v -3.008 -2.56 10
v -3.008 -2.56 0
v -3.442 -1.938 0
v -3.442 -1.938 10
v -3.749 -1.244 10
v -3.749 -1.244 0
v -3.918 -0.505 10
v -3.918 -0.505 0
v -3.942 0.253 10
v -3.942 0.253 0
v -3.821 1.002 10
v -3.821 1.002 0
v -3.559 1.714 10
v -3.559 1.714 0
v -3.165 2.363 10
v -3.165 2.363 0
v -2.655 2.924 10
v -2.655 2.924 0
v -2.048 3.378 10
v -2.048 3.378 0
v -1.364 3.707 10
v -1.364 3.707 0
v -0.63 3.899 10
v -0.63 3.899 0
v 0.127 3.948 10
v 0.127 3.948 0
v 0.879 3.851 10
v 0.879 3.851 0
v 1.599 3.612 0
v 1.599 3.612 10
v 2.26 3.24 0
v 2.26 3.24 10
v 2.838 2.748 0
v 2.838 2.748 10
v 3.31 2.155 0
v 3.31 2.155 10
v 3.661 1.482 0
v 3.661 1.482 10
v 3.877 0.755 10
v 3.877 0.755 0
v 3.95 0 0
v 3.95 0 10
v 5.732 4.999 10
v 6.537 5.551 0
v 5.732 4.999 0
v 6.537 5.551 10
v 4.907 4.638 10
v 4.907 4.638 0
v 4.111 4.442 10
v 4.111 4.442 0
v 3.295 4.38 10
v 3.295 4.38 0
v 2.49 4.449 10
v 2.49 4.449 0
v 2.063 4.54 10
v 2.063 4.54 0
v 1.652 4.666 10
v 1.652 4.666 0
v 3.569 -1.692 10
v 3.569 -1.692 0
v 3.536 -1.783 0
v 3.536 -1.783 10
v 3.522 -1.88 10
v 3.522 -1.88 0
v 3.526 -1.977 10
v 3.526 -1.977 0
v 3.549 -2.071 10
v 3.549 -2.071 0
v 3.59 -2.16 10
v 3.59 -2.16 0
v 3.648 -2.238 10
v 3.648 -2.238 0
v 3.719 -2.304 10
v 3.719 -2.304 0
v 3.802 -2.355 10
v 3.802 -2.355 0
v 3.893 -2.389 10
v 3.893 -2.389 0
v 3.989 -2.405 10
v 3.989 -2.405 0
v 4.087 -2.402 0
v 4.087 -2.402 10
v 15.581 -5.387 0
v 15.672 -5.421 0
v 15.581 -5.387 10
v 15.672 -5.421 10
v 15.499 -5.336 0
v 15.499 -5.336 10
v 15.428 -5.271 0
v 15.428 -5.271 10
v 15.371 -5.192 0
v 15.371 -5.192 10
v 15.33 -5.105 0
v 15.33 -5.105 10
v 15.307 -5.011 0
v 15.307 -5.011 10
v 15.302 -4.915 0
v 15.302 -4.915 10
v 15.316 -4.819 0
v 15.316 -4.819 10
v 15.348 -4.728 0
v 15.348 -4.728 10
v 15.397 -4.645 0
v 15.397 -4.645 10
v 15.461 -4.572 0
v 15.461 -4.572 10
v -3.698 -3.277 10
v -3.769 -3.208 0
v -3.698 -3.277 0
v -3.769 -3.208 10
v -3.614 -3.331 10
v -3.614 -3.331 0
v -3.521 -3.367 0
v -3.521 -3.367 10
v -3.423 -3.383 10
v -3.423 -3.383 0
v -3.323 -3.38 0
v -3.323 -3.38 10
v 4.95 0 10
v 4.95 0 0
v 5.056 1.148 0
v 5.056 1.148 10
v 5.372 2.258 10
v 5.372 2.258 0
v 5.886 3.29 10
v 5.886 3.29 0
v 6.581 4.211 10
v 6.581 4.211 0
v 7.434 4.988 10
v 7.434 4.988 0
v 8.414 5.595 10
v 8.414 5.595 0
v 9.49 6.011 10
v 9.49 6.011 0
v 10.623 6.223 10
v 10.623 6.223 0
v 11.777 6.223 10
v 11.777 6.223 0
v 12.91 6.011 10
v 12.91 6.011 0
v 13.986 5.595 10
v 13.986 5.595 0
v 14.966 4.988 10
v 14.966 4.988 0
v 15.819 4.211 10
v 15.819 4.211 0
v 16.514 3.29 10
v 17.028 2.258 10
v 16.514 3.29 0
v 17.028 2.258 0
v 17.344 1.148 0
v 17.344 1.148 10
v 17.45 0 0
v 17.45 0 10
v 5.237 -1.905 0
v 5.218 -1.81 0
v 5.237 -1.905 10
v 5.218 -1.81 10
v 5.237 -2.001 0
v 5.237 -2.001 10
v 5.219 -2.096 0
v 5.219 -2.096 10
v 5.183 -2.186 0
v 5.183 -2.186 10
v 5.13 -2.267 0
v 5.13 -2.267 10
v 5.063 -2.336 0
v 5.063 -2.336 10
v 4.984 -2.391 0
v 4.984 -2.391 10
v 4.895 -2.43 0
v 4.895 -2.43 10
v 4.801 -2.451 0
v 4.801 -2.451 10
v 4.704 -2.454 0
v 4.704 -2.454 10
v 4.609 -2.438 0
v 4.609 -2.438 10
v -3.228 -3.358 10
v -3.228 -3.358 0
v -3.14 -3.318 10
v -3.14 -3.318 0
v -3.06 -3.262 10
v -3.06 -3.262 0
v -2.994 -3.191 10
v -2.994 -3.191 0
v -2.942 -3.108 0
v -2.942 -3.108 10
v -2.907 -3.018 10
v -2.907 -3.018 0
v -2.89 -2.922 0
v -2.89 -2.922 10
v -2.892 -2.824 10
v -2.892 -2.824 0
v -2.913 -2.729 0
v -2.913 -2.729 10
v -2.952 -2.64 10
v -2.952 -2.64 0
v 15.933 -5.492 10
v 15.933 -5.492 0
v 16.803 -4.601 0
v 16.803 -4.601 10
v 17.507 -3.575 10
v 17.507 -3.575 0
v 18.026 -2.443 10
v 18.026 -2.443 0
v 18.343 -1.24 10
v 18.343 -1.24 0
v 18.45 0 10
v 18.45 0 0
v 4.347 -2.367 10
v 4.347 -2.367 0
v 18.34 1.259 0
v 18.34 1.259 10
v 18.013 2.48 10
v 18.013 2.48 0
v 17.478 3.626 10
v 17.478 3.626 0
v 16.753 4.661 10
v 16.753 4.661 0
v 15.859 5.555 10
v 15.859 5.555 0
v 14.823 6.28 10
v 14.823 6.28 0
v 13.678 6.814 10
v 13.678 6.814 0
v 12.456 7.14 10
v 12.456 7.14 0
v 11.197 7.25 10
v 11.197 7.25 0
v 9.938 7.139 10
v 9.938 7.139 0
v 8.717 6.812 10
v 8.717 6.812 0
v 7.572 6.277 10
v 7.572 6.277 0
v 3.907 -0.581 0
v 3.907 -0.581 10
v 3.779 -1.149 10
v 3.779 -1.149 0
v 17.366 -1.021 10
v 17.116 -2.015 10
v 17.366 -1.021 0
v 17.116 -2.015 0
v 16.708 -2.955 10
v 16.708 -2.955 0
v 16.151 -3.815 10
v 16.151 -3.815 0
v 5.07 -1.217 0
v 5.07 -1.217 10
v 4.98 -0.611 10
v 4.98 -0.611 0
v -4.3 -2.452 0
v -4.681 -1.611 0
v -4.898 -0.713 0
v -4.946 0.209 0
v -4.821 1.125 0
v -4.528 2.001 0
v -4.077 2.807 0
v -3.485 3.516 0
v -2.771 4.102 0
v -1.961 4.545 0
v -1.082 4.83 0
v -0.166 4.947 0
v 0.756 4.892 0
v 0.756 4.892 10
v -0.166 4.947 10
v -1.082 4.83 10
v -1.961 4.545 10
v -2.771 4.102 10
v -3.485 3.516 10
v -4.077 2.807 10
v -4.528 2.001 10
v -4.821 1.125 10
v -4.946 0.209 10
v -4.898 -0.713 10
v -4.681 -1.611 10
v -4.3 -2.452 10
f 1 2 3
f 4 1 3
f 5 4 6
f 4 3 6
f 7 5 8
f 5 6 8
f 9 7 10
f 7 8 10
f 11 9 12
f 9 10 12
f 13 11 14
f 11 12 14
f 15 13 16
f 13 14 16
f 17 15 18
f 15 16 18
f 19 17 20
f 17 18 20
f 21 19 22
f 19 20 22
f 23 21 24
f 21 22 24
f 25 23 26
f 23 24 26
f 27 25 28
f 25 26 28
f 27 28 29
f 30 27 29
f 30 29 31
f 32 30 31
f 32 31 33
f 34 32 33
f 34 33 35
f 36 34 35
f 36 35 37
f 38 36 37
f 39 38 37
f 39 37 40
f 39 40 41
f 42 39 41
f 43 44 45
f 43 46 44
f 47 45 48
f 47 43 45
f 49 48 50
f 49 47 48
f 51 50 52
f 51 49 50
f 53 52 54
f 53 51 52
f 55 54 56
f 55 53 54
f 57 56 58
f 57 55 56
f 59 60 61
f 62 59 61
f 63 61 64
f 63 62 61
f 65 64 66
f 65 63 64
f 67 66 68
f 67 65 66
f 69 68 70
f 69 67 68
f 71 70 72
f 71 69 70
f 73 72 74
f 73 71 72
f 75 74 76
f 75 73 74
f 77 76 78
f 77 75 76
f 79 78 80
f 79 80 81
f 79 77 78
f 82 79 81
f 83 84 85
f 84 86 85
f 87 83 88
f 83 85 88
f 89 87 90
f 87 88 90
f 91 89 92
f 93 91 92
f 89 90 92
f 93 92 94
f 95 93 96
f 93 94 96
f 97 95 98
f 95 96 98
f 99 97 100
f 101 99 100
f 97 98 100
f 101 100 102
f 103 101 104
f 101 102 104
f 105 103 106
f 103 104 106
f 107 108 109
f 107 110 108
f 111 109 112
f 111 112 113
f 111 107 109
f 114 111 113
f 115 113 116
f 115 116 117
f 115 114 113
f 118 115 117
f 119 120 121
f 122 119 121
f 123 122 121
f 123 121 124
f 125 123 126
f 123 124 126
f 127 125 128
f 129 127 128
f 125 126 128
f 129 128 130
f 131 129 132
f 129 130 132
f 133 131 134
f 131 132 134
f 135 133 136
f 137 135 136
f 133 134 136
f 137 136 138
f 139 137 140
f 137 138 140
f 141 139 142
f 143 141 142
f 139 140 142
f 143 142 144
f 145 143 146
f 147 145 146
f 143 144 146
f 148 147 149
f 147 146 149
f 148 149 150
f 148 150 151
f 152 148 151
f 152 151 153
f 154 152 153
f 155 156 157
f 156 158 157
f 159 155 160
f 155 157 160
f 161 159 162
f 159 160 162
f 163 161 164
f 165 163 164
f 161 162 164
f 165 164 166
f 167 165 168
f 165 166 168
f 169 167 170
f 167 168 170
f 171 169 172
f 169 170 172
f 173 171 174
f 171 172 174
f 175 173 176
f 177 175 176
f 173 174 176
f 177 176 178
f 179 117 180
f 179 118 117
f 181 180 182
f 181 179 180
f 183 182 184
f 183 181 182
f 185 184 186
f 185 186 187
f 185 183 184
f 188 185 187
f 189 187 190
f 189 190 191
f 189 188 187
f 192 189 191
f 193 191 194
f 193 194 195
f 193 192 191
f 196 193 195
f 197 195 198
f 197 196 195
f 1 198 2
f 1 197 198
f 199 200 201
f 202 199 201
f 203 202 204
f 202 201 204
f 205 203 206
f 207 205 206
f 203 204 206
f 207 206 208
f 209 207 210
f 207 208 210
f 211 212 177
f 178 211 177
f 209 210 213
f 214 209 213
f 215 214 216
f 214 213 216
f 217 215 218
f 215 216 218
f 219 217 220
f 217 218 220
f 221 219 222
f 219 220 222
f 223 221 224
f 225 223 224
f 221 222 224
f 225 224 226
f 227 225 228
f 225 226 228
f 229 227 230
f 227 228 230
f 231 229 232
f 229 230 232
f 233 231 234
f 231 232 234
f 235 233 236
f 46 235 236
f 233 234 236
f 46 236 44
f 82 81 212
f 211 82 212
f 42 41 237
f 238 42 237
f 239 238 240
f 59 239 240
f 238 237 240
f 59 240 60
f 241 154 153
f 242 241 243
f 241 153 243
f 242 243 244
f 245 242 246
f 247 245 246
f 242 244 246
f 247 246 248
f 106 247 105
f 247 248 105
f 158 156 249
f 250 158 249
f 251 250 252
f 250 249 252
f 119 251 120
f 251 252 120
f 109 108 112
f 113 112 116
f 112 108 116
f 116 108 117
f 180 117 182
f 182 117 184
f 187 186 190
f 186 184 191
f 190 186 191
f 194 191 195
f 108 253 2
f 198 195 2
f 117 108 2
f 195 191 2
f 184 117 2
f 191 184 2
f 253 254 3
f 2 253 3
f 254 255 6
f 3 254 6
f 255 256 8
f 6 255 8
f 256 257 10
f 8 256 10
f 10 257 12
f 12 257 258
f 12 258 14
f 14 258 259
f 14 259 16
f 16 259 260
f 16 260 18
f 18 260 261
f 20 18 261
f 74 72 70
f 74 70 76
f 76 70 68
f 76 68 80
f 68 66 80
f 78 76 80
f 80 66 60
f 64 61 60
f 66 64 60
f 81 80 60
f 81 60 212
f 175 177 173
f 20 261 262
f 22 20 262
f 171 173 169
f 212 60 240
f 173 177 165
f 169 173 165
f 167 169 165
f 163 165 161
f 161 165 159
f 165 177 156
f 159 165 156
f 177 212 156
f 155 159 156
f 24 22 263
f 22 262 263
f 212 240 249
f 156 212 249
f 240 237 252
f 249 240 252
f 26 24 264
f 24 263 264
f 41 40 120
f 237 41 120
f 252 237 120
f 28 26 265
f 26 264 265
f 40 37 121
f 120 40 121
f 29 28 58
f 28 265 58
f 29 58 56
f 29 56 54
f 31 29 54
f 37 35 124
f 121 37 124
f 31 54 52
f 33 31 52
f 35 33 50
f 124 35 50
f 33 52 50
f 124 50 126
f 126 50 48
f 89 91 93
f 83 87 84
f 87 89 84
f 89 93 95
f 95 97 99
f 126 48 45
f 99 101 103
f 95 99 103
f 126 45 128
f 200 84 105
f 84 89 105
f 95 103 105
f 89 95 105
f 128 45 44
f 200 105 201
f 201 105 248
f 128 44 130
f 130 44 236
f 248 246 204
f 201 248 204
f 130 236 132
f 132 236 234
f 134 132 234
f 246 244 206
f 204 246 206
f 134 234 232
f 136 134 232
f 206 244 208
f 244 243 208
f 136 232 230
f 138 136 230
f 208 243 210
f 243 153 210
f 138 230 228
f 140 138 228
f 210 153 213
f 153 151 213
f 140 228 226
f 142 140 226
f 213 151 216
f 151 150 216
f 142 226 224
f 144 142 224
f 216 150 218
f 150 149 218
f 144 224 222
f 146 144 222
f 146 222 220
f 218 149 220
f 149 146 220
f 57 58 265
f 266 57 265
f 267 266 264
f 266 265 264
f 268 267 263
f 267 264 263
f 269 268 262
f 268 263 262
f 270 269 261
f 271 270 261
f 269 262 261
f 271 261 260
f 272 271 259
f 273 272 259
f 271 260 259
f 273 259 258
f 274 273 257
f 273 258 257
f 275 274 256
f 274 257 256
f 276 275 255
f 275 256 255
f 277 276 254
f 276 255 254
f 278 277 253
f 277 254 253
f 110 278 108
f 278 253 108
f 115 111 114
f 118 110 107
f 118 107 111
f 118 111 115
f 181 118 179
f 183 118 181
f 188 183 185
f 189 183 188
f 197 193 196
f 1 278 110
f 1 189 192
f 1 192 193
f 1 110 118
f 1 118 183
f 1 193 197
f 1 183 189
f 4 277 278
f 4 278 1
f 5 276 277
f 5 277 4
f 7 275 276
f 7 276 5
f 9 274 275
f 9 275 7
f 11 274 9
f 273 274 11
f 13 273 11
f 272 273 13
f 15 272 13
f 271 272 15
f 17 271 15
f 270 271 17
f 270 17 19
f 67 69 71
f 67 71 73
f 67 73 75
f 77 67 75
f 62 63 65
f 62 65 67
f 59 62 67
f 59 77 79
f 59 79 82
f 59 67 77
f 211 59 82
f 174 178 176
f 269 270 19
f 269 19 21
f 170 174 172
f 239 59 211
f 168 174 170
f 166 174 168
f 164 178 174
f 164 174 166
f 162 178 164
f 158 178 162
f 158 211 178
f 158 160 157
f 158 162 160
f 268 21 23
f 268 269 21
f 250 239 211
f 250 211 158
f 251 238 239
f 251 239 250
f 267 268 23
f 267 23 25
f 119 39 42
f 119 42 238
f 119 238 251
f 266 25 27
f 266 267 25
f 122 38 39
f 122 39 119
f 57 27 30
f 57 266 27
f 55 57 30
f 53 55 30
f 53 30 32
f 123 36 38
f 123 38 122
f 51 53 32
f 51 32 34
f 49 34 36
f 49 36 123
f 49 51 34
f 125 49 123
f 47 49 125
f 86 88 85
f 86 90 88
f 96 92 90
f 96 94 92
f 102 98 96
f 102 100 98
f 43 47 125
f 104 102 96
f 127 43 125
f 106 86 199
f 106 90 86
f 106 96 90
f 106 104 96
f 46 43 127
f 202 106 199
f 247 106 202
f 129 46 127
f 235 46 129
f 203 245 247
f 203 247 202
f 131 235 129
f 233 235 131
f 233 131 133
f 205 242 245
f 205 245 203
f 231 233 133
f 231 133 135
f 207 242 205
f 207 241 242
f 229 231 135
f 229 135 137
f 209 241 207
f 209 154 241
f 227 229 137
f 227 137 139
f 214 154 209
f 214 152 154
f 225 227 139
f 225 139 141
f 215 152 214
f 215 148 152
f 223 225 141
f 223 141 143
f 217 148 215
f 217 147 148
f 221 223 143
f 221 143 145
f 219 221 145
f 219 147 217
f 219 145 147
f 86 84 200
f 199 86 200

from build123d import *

# Parameters (mm, degrees)
F1_DEPTH = 10
F2_R     = 5
F3_R     = 0.49999


# Not quite as in the source:
# - a fillet or chamfer is up to 0.001 mm smaller than in the source, because OpenCascade refuses the exact size


with BuildPart() as f1:
    # F0 (on Top) → F1 (new body)
    with BuildSketch(Plane.XY):
        with BuildLine():
            ThreePointArc((-2.2598988064, -3.2396538989), (-1.8270057081, 3.5020779749), (3.95, 0))
            ThreePointArc((3.95, 0), (4.0500202922, 1.2001209016), (4.3473214286, 2.3671283017))
            ThreePointArc((4.3473214286, 2.3671283017), (-2.9159046624, 4), (-3.5838223047, -3.4144864458))
            Line((-3.5838223047, -3.4144864458), (-2.2598988064, -3.2396538989))
        make_face()
        with BuildLine():
            ThreePointArc((4.3473214286, 2.3671283017), (4.0500202922, 1.2001209016), (3.95, 0))
            ThreePointArc((3.95, 0), (4.0500202922, -1.2001209016), (4.3473214286, -2.3671283017))
            ThreePointArc((4.3473214286, -2.3671283017), (4.7969647211, -1.2213228338), (4.95, 0))
            ThreePointArc((4.95, 0), (4.7969647211, 1.2213228338), (4.3473214286, 2.3671283017))
        make_face()
        with BuildLine():
            ThreePointArc((4.3473214286, -2.3671283017), (4.0500202922, -1.2001209016), (3.95, 0))
            ThreePointArc((3.95, 0), (3.7111266365, -1.352789373), (3.0233979302, -2.5419608485))
            Line((3.0233979302, -2.5419608485), (4.3473214286, -2.3671283017))
        make_face()
        with BuildLine():
            ThreePointArc((4.95, 0), (4.7969647211, -1.2213228338), (4.3473214286, -2.3671283017))
            Line((4.3473214286, -2.3671283017), (5.5605645672, -2.6943028782))
            ThreePointArc((5.5605645672, -2.6943028782), (5.1045520487, -1.3813088983), (4.95, 0))
        make_face()
        with BuildLine():
            ThreePointArc((18.45, 0), (12.4001209016, 7.1499797078), (4.3473214286, 2.3671283017))
            ThreePointArc((4.3473214286, 2.3671283017), (4.7969647211, 1.2213228338), (4.95, 0))
            ThreePointArc((4.95, 0), (11.2, 6.25), (17.45, 0))
            ThreePointArc((17.45, 0), (16.7255629222, -2.9207284011), (14.7201905943, -5.1643739388))
            Line((14.7201905943, -5.1643739388), (15.9334337329, -5.4915485153))
            ThreePointArc((15.9334337329, -5.4915485153), (17.790898822, -3.0203563893), (18.45, 0))
        make_face()
    extrude(amount=F1_DEPTH)

    # F2
    f2_edges = [f1.edges().sort_by_distance(p)[0] for p in [
        (4.347321, 2.367128, 5),
    ]]
    fillet(f2_edges, radius=F2_R)

    # F3 (radius 0.5 in the source; OpenCascade refuses exactly that, so slightly less here)
    f3_edges = [f1.edges().sort_by_distance(p)[0] for p in [
        (-2.259899, -3.239654, 5),
        (3.023398, -2.541961, 5),
        (5.560565, -2.694303, 5),
        (14.720191, -5.164374, 5),
        (-3.583822, -3.414486, 5),
    ]]
    fillet(f3_edges, radius=F3_R)


solid = f1.part
